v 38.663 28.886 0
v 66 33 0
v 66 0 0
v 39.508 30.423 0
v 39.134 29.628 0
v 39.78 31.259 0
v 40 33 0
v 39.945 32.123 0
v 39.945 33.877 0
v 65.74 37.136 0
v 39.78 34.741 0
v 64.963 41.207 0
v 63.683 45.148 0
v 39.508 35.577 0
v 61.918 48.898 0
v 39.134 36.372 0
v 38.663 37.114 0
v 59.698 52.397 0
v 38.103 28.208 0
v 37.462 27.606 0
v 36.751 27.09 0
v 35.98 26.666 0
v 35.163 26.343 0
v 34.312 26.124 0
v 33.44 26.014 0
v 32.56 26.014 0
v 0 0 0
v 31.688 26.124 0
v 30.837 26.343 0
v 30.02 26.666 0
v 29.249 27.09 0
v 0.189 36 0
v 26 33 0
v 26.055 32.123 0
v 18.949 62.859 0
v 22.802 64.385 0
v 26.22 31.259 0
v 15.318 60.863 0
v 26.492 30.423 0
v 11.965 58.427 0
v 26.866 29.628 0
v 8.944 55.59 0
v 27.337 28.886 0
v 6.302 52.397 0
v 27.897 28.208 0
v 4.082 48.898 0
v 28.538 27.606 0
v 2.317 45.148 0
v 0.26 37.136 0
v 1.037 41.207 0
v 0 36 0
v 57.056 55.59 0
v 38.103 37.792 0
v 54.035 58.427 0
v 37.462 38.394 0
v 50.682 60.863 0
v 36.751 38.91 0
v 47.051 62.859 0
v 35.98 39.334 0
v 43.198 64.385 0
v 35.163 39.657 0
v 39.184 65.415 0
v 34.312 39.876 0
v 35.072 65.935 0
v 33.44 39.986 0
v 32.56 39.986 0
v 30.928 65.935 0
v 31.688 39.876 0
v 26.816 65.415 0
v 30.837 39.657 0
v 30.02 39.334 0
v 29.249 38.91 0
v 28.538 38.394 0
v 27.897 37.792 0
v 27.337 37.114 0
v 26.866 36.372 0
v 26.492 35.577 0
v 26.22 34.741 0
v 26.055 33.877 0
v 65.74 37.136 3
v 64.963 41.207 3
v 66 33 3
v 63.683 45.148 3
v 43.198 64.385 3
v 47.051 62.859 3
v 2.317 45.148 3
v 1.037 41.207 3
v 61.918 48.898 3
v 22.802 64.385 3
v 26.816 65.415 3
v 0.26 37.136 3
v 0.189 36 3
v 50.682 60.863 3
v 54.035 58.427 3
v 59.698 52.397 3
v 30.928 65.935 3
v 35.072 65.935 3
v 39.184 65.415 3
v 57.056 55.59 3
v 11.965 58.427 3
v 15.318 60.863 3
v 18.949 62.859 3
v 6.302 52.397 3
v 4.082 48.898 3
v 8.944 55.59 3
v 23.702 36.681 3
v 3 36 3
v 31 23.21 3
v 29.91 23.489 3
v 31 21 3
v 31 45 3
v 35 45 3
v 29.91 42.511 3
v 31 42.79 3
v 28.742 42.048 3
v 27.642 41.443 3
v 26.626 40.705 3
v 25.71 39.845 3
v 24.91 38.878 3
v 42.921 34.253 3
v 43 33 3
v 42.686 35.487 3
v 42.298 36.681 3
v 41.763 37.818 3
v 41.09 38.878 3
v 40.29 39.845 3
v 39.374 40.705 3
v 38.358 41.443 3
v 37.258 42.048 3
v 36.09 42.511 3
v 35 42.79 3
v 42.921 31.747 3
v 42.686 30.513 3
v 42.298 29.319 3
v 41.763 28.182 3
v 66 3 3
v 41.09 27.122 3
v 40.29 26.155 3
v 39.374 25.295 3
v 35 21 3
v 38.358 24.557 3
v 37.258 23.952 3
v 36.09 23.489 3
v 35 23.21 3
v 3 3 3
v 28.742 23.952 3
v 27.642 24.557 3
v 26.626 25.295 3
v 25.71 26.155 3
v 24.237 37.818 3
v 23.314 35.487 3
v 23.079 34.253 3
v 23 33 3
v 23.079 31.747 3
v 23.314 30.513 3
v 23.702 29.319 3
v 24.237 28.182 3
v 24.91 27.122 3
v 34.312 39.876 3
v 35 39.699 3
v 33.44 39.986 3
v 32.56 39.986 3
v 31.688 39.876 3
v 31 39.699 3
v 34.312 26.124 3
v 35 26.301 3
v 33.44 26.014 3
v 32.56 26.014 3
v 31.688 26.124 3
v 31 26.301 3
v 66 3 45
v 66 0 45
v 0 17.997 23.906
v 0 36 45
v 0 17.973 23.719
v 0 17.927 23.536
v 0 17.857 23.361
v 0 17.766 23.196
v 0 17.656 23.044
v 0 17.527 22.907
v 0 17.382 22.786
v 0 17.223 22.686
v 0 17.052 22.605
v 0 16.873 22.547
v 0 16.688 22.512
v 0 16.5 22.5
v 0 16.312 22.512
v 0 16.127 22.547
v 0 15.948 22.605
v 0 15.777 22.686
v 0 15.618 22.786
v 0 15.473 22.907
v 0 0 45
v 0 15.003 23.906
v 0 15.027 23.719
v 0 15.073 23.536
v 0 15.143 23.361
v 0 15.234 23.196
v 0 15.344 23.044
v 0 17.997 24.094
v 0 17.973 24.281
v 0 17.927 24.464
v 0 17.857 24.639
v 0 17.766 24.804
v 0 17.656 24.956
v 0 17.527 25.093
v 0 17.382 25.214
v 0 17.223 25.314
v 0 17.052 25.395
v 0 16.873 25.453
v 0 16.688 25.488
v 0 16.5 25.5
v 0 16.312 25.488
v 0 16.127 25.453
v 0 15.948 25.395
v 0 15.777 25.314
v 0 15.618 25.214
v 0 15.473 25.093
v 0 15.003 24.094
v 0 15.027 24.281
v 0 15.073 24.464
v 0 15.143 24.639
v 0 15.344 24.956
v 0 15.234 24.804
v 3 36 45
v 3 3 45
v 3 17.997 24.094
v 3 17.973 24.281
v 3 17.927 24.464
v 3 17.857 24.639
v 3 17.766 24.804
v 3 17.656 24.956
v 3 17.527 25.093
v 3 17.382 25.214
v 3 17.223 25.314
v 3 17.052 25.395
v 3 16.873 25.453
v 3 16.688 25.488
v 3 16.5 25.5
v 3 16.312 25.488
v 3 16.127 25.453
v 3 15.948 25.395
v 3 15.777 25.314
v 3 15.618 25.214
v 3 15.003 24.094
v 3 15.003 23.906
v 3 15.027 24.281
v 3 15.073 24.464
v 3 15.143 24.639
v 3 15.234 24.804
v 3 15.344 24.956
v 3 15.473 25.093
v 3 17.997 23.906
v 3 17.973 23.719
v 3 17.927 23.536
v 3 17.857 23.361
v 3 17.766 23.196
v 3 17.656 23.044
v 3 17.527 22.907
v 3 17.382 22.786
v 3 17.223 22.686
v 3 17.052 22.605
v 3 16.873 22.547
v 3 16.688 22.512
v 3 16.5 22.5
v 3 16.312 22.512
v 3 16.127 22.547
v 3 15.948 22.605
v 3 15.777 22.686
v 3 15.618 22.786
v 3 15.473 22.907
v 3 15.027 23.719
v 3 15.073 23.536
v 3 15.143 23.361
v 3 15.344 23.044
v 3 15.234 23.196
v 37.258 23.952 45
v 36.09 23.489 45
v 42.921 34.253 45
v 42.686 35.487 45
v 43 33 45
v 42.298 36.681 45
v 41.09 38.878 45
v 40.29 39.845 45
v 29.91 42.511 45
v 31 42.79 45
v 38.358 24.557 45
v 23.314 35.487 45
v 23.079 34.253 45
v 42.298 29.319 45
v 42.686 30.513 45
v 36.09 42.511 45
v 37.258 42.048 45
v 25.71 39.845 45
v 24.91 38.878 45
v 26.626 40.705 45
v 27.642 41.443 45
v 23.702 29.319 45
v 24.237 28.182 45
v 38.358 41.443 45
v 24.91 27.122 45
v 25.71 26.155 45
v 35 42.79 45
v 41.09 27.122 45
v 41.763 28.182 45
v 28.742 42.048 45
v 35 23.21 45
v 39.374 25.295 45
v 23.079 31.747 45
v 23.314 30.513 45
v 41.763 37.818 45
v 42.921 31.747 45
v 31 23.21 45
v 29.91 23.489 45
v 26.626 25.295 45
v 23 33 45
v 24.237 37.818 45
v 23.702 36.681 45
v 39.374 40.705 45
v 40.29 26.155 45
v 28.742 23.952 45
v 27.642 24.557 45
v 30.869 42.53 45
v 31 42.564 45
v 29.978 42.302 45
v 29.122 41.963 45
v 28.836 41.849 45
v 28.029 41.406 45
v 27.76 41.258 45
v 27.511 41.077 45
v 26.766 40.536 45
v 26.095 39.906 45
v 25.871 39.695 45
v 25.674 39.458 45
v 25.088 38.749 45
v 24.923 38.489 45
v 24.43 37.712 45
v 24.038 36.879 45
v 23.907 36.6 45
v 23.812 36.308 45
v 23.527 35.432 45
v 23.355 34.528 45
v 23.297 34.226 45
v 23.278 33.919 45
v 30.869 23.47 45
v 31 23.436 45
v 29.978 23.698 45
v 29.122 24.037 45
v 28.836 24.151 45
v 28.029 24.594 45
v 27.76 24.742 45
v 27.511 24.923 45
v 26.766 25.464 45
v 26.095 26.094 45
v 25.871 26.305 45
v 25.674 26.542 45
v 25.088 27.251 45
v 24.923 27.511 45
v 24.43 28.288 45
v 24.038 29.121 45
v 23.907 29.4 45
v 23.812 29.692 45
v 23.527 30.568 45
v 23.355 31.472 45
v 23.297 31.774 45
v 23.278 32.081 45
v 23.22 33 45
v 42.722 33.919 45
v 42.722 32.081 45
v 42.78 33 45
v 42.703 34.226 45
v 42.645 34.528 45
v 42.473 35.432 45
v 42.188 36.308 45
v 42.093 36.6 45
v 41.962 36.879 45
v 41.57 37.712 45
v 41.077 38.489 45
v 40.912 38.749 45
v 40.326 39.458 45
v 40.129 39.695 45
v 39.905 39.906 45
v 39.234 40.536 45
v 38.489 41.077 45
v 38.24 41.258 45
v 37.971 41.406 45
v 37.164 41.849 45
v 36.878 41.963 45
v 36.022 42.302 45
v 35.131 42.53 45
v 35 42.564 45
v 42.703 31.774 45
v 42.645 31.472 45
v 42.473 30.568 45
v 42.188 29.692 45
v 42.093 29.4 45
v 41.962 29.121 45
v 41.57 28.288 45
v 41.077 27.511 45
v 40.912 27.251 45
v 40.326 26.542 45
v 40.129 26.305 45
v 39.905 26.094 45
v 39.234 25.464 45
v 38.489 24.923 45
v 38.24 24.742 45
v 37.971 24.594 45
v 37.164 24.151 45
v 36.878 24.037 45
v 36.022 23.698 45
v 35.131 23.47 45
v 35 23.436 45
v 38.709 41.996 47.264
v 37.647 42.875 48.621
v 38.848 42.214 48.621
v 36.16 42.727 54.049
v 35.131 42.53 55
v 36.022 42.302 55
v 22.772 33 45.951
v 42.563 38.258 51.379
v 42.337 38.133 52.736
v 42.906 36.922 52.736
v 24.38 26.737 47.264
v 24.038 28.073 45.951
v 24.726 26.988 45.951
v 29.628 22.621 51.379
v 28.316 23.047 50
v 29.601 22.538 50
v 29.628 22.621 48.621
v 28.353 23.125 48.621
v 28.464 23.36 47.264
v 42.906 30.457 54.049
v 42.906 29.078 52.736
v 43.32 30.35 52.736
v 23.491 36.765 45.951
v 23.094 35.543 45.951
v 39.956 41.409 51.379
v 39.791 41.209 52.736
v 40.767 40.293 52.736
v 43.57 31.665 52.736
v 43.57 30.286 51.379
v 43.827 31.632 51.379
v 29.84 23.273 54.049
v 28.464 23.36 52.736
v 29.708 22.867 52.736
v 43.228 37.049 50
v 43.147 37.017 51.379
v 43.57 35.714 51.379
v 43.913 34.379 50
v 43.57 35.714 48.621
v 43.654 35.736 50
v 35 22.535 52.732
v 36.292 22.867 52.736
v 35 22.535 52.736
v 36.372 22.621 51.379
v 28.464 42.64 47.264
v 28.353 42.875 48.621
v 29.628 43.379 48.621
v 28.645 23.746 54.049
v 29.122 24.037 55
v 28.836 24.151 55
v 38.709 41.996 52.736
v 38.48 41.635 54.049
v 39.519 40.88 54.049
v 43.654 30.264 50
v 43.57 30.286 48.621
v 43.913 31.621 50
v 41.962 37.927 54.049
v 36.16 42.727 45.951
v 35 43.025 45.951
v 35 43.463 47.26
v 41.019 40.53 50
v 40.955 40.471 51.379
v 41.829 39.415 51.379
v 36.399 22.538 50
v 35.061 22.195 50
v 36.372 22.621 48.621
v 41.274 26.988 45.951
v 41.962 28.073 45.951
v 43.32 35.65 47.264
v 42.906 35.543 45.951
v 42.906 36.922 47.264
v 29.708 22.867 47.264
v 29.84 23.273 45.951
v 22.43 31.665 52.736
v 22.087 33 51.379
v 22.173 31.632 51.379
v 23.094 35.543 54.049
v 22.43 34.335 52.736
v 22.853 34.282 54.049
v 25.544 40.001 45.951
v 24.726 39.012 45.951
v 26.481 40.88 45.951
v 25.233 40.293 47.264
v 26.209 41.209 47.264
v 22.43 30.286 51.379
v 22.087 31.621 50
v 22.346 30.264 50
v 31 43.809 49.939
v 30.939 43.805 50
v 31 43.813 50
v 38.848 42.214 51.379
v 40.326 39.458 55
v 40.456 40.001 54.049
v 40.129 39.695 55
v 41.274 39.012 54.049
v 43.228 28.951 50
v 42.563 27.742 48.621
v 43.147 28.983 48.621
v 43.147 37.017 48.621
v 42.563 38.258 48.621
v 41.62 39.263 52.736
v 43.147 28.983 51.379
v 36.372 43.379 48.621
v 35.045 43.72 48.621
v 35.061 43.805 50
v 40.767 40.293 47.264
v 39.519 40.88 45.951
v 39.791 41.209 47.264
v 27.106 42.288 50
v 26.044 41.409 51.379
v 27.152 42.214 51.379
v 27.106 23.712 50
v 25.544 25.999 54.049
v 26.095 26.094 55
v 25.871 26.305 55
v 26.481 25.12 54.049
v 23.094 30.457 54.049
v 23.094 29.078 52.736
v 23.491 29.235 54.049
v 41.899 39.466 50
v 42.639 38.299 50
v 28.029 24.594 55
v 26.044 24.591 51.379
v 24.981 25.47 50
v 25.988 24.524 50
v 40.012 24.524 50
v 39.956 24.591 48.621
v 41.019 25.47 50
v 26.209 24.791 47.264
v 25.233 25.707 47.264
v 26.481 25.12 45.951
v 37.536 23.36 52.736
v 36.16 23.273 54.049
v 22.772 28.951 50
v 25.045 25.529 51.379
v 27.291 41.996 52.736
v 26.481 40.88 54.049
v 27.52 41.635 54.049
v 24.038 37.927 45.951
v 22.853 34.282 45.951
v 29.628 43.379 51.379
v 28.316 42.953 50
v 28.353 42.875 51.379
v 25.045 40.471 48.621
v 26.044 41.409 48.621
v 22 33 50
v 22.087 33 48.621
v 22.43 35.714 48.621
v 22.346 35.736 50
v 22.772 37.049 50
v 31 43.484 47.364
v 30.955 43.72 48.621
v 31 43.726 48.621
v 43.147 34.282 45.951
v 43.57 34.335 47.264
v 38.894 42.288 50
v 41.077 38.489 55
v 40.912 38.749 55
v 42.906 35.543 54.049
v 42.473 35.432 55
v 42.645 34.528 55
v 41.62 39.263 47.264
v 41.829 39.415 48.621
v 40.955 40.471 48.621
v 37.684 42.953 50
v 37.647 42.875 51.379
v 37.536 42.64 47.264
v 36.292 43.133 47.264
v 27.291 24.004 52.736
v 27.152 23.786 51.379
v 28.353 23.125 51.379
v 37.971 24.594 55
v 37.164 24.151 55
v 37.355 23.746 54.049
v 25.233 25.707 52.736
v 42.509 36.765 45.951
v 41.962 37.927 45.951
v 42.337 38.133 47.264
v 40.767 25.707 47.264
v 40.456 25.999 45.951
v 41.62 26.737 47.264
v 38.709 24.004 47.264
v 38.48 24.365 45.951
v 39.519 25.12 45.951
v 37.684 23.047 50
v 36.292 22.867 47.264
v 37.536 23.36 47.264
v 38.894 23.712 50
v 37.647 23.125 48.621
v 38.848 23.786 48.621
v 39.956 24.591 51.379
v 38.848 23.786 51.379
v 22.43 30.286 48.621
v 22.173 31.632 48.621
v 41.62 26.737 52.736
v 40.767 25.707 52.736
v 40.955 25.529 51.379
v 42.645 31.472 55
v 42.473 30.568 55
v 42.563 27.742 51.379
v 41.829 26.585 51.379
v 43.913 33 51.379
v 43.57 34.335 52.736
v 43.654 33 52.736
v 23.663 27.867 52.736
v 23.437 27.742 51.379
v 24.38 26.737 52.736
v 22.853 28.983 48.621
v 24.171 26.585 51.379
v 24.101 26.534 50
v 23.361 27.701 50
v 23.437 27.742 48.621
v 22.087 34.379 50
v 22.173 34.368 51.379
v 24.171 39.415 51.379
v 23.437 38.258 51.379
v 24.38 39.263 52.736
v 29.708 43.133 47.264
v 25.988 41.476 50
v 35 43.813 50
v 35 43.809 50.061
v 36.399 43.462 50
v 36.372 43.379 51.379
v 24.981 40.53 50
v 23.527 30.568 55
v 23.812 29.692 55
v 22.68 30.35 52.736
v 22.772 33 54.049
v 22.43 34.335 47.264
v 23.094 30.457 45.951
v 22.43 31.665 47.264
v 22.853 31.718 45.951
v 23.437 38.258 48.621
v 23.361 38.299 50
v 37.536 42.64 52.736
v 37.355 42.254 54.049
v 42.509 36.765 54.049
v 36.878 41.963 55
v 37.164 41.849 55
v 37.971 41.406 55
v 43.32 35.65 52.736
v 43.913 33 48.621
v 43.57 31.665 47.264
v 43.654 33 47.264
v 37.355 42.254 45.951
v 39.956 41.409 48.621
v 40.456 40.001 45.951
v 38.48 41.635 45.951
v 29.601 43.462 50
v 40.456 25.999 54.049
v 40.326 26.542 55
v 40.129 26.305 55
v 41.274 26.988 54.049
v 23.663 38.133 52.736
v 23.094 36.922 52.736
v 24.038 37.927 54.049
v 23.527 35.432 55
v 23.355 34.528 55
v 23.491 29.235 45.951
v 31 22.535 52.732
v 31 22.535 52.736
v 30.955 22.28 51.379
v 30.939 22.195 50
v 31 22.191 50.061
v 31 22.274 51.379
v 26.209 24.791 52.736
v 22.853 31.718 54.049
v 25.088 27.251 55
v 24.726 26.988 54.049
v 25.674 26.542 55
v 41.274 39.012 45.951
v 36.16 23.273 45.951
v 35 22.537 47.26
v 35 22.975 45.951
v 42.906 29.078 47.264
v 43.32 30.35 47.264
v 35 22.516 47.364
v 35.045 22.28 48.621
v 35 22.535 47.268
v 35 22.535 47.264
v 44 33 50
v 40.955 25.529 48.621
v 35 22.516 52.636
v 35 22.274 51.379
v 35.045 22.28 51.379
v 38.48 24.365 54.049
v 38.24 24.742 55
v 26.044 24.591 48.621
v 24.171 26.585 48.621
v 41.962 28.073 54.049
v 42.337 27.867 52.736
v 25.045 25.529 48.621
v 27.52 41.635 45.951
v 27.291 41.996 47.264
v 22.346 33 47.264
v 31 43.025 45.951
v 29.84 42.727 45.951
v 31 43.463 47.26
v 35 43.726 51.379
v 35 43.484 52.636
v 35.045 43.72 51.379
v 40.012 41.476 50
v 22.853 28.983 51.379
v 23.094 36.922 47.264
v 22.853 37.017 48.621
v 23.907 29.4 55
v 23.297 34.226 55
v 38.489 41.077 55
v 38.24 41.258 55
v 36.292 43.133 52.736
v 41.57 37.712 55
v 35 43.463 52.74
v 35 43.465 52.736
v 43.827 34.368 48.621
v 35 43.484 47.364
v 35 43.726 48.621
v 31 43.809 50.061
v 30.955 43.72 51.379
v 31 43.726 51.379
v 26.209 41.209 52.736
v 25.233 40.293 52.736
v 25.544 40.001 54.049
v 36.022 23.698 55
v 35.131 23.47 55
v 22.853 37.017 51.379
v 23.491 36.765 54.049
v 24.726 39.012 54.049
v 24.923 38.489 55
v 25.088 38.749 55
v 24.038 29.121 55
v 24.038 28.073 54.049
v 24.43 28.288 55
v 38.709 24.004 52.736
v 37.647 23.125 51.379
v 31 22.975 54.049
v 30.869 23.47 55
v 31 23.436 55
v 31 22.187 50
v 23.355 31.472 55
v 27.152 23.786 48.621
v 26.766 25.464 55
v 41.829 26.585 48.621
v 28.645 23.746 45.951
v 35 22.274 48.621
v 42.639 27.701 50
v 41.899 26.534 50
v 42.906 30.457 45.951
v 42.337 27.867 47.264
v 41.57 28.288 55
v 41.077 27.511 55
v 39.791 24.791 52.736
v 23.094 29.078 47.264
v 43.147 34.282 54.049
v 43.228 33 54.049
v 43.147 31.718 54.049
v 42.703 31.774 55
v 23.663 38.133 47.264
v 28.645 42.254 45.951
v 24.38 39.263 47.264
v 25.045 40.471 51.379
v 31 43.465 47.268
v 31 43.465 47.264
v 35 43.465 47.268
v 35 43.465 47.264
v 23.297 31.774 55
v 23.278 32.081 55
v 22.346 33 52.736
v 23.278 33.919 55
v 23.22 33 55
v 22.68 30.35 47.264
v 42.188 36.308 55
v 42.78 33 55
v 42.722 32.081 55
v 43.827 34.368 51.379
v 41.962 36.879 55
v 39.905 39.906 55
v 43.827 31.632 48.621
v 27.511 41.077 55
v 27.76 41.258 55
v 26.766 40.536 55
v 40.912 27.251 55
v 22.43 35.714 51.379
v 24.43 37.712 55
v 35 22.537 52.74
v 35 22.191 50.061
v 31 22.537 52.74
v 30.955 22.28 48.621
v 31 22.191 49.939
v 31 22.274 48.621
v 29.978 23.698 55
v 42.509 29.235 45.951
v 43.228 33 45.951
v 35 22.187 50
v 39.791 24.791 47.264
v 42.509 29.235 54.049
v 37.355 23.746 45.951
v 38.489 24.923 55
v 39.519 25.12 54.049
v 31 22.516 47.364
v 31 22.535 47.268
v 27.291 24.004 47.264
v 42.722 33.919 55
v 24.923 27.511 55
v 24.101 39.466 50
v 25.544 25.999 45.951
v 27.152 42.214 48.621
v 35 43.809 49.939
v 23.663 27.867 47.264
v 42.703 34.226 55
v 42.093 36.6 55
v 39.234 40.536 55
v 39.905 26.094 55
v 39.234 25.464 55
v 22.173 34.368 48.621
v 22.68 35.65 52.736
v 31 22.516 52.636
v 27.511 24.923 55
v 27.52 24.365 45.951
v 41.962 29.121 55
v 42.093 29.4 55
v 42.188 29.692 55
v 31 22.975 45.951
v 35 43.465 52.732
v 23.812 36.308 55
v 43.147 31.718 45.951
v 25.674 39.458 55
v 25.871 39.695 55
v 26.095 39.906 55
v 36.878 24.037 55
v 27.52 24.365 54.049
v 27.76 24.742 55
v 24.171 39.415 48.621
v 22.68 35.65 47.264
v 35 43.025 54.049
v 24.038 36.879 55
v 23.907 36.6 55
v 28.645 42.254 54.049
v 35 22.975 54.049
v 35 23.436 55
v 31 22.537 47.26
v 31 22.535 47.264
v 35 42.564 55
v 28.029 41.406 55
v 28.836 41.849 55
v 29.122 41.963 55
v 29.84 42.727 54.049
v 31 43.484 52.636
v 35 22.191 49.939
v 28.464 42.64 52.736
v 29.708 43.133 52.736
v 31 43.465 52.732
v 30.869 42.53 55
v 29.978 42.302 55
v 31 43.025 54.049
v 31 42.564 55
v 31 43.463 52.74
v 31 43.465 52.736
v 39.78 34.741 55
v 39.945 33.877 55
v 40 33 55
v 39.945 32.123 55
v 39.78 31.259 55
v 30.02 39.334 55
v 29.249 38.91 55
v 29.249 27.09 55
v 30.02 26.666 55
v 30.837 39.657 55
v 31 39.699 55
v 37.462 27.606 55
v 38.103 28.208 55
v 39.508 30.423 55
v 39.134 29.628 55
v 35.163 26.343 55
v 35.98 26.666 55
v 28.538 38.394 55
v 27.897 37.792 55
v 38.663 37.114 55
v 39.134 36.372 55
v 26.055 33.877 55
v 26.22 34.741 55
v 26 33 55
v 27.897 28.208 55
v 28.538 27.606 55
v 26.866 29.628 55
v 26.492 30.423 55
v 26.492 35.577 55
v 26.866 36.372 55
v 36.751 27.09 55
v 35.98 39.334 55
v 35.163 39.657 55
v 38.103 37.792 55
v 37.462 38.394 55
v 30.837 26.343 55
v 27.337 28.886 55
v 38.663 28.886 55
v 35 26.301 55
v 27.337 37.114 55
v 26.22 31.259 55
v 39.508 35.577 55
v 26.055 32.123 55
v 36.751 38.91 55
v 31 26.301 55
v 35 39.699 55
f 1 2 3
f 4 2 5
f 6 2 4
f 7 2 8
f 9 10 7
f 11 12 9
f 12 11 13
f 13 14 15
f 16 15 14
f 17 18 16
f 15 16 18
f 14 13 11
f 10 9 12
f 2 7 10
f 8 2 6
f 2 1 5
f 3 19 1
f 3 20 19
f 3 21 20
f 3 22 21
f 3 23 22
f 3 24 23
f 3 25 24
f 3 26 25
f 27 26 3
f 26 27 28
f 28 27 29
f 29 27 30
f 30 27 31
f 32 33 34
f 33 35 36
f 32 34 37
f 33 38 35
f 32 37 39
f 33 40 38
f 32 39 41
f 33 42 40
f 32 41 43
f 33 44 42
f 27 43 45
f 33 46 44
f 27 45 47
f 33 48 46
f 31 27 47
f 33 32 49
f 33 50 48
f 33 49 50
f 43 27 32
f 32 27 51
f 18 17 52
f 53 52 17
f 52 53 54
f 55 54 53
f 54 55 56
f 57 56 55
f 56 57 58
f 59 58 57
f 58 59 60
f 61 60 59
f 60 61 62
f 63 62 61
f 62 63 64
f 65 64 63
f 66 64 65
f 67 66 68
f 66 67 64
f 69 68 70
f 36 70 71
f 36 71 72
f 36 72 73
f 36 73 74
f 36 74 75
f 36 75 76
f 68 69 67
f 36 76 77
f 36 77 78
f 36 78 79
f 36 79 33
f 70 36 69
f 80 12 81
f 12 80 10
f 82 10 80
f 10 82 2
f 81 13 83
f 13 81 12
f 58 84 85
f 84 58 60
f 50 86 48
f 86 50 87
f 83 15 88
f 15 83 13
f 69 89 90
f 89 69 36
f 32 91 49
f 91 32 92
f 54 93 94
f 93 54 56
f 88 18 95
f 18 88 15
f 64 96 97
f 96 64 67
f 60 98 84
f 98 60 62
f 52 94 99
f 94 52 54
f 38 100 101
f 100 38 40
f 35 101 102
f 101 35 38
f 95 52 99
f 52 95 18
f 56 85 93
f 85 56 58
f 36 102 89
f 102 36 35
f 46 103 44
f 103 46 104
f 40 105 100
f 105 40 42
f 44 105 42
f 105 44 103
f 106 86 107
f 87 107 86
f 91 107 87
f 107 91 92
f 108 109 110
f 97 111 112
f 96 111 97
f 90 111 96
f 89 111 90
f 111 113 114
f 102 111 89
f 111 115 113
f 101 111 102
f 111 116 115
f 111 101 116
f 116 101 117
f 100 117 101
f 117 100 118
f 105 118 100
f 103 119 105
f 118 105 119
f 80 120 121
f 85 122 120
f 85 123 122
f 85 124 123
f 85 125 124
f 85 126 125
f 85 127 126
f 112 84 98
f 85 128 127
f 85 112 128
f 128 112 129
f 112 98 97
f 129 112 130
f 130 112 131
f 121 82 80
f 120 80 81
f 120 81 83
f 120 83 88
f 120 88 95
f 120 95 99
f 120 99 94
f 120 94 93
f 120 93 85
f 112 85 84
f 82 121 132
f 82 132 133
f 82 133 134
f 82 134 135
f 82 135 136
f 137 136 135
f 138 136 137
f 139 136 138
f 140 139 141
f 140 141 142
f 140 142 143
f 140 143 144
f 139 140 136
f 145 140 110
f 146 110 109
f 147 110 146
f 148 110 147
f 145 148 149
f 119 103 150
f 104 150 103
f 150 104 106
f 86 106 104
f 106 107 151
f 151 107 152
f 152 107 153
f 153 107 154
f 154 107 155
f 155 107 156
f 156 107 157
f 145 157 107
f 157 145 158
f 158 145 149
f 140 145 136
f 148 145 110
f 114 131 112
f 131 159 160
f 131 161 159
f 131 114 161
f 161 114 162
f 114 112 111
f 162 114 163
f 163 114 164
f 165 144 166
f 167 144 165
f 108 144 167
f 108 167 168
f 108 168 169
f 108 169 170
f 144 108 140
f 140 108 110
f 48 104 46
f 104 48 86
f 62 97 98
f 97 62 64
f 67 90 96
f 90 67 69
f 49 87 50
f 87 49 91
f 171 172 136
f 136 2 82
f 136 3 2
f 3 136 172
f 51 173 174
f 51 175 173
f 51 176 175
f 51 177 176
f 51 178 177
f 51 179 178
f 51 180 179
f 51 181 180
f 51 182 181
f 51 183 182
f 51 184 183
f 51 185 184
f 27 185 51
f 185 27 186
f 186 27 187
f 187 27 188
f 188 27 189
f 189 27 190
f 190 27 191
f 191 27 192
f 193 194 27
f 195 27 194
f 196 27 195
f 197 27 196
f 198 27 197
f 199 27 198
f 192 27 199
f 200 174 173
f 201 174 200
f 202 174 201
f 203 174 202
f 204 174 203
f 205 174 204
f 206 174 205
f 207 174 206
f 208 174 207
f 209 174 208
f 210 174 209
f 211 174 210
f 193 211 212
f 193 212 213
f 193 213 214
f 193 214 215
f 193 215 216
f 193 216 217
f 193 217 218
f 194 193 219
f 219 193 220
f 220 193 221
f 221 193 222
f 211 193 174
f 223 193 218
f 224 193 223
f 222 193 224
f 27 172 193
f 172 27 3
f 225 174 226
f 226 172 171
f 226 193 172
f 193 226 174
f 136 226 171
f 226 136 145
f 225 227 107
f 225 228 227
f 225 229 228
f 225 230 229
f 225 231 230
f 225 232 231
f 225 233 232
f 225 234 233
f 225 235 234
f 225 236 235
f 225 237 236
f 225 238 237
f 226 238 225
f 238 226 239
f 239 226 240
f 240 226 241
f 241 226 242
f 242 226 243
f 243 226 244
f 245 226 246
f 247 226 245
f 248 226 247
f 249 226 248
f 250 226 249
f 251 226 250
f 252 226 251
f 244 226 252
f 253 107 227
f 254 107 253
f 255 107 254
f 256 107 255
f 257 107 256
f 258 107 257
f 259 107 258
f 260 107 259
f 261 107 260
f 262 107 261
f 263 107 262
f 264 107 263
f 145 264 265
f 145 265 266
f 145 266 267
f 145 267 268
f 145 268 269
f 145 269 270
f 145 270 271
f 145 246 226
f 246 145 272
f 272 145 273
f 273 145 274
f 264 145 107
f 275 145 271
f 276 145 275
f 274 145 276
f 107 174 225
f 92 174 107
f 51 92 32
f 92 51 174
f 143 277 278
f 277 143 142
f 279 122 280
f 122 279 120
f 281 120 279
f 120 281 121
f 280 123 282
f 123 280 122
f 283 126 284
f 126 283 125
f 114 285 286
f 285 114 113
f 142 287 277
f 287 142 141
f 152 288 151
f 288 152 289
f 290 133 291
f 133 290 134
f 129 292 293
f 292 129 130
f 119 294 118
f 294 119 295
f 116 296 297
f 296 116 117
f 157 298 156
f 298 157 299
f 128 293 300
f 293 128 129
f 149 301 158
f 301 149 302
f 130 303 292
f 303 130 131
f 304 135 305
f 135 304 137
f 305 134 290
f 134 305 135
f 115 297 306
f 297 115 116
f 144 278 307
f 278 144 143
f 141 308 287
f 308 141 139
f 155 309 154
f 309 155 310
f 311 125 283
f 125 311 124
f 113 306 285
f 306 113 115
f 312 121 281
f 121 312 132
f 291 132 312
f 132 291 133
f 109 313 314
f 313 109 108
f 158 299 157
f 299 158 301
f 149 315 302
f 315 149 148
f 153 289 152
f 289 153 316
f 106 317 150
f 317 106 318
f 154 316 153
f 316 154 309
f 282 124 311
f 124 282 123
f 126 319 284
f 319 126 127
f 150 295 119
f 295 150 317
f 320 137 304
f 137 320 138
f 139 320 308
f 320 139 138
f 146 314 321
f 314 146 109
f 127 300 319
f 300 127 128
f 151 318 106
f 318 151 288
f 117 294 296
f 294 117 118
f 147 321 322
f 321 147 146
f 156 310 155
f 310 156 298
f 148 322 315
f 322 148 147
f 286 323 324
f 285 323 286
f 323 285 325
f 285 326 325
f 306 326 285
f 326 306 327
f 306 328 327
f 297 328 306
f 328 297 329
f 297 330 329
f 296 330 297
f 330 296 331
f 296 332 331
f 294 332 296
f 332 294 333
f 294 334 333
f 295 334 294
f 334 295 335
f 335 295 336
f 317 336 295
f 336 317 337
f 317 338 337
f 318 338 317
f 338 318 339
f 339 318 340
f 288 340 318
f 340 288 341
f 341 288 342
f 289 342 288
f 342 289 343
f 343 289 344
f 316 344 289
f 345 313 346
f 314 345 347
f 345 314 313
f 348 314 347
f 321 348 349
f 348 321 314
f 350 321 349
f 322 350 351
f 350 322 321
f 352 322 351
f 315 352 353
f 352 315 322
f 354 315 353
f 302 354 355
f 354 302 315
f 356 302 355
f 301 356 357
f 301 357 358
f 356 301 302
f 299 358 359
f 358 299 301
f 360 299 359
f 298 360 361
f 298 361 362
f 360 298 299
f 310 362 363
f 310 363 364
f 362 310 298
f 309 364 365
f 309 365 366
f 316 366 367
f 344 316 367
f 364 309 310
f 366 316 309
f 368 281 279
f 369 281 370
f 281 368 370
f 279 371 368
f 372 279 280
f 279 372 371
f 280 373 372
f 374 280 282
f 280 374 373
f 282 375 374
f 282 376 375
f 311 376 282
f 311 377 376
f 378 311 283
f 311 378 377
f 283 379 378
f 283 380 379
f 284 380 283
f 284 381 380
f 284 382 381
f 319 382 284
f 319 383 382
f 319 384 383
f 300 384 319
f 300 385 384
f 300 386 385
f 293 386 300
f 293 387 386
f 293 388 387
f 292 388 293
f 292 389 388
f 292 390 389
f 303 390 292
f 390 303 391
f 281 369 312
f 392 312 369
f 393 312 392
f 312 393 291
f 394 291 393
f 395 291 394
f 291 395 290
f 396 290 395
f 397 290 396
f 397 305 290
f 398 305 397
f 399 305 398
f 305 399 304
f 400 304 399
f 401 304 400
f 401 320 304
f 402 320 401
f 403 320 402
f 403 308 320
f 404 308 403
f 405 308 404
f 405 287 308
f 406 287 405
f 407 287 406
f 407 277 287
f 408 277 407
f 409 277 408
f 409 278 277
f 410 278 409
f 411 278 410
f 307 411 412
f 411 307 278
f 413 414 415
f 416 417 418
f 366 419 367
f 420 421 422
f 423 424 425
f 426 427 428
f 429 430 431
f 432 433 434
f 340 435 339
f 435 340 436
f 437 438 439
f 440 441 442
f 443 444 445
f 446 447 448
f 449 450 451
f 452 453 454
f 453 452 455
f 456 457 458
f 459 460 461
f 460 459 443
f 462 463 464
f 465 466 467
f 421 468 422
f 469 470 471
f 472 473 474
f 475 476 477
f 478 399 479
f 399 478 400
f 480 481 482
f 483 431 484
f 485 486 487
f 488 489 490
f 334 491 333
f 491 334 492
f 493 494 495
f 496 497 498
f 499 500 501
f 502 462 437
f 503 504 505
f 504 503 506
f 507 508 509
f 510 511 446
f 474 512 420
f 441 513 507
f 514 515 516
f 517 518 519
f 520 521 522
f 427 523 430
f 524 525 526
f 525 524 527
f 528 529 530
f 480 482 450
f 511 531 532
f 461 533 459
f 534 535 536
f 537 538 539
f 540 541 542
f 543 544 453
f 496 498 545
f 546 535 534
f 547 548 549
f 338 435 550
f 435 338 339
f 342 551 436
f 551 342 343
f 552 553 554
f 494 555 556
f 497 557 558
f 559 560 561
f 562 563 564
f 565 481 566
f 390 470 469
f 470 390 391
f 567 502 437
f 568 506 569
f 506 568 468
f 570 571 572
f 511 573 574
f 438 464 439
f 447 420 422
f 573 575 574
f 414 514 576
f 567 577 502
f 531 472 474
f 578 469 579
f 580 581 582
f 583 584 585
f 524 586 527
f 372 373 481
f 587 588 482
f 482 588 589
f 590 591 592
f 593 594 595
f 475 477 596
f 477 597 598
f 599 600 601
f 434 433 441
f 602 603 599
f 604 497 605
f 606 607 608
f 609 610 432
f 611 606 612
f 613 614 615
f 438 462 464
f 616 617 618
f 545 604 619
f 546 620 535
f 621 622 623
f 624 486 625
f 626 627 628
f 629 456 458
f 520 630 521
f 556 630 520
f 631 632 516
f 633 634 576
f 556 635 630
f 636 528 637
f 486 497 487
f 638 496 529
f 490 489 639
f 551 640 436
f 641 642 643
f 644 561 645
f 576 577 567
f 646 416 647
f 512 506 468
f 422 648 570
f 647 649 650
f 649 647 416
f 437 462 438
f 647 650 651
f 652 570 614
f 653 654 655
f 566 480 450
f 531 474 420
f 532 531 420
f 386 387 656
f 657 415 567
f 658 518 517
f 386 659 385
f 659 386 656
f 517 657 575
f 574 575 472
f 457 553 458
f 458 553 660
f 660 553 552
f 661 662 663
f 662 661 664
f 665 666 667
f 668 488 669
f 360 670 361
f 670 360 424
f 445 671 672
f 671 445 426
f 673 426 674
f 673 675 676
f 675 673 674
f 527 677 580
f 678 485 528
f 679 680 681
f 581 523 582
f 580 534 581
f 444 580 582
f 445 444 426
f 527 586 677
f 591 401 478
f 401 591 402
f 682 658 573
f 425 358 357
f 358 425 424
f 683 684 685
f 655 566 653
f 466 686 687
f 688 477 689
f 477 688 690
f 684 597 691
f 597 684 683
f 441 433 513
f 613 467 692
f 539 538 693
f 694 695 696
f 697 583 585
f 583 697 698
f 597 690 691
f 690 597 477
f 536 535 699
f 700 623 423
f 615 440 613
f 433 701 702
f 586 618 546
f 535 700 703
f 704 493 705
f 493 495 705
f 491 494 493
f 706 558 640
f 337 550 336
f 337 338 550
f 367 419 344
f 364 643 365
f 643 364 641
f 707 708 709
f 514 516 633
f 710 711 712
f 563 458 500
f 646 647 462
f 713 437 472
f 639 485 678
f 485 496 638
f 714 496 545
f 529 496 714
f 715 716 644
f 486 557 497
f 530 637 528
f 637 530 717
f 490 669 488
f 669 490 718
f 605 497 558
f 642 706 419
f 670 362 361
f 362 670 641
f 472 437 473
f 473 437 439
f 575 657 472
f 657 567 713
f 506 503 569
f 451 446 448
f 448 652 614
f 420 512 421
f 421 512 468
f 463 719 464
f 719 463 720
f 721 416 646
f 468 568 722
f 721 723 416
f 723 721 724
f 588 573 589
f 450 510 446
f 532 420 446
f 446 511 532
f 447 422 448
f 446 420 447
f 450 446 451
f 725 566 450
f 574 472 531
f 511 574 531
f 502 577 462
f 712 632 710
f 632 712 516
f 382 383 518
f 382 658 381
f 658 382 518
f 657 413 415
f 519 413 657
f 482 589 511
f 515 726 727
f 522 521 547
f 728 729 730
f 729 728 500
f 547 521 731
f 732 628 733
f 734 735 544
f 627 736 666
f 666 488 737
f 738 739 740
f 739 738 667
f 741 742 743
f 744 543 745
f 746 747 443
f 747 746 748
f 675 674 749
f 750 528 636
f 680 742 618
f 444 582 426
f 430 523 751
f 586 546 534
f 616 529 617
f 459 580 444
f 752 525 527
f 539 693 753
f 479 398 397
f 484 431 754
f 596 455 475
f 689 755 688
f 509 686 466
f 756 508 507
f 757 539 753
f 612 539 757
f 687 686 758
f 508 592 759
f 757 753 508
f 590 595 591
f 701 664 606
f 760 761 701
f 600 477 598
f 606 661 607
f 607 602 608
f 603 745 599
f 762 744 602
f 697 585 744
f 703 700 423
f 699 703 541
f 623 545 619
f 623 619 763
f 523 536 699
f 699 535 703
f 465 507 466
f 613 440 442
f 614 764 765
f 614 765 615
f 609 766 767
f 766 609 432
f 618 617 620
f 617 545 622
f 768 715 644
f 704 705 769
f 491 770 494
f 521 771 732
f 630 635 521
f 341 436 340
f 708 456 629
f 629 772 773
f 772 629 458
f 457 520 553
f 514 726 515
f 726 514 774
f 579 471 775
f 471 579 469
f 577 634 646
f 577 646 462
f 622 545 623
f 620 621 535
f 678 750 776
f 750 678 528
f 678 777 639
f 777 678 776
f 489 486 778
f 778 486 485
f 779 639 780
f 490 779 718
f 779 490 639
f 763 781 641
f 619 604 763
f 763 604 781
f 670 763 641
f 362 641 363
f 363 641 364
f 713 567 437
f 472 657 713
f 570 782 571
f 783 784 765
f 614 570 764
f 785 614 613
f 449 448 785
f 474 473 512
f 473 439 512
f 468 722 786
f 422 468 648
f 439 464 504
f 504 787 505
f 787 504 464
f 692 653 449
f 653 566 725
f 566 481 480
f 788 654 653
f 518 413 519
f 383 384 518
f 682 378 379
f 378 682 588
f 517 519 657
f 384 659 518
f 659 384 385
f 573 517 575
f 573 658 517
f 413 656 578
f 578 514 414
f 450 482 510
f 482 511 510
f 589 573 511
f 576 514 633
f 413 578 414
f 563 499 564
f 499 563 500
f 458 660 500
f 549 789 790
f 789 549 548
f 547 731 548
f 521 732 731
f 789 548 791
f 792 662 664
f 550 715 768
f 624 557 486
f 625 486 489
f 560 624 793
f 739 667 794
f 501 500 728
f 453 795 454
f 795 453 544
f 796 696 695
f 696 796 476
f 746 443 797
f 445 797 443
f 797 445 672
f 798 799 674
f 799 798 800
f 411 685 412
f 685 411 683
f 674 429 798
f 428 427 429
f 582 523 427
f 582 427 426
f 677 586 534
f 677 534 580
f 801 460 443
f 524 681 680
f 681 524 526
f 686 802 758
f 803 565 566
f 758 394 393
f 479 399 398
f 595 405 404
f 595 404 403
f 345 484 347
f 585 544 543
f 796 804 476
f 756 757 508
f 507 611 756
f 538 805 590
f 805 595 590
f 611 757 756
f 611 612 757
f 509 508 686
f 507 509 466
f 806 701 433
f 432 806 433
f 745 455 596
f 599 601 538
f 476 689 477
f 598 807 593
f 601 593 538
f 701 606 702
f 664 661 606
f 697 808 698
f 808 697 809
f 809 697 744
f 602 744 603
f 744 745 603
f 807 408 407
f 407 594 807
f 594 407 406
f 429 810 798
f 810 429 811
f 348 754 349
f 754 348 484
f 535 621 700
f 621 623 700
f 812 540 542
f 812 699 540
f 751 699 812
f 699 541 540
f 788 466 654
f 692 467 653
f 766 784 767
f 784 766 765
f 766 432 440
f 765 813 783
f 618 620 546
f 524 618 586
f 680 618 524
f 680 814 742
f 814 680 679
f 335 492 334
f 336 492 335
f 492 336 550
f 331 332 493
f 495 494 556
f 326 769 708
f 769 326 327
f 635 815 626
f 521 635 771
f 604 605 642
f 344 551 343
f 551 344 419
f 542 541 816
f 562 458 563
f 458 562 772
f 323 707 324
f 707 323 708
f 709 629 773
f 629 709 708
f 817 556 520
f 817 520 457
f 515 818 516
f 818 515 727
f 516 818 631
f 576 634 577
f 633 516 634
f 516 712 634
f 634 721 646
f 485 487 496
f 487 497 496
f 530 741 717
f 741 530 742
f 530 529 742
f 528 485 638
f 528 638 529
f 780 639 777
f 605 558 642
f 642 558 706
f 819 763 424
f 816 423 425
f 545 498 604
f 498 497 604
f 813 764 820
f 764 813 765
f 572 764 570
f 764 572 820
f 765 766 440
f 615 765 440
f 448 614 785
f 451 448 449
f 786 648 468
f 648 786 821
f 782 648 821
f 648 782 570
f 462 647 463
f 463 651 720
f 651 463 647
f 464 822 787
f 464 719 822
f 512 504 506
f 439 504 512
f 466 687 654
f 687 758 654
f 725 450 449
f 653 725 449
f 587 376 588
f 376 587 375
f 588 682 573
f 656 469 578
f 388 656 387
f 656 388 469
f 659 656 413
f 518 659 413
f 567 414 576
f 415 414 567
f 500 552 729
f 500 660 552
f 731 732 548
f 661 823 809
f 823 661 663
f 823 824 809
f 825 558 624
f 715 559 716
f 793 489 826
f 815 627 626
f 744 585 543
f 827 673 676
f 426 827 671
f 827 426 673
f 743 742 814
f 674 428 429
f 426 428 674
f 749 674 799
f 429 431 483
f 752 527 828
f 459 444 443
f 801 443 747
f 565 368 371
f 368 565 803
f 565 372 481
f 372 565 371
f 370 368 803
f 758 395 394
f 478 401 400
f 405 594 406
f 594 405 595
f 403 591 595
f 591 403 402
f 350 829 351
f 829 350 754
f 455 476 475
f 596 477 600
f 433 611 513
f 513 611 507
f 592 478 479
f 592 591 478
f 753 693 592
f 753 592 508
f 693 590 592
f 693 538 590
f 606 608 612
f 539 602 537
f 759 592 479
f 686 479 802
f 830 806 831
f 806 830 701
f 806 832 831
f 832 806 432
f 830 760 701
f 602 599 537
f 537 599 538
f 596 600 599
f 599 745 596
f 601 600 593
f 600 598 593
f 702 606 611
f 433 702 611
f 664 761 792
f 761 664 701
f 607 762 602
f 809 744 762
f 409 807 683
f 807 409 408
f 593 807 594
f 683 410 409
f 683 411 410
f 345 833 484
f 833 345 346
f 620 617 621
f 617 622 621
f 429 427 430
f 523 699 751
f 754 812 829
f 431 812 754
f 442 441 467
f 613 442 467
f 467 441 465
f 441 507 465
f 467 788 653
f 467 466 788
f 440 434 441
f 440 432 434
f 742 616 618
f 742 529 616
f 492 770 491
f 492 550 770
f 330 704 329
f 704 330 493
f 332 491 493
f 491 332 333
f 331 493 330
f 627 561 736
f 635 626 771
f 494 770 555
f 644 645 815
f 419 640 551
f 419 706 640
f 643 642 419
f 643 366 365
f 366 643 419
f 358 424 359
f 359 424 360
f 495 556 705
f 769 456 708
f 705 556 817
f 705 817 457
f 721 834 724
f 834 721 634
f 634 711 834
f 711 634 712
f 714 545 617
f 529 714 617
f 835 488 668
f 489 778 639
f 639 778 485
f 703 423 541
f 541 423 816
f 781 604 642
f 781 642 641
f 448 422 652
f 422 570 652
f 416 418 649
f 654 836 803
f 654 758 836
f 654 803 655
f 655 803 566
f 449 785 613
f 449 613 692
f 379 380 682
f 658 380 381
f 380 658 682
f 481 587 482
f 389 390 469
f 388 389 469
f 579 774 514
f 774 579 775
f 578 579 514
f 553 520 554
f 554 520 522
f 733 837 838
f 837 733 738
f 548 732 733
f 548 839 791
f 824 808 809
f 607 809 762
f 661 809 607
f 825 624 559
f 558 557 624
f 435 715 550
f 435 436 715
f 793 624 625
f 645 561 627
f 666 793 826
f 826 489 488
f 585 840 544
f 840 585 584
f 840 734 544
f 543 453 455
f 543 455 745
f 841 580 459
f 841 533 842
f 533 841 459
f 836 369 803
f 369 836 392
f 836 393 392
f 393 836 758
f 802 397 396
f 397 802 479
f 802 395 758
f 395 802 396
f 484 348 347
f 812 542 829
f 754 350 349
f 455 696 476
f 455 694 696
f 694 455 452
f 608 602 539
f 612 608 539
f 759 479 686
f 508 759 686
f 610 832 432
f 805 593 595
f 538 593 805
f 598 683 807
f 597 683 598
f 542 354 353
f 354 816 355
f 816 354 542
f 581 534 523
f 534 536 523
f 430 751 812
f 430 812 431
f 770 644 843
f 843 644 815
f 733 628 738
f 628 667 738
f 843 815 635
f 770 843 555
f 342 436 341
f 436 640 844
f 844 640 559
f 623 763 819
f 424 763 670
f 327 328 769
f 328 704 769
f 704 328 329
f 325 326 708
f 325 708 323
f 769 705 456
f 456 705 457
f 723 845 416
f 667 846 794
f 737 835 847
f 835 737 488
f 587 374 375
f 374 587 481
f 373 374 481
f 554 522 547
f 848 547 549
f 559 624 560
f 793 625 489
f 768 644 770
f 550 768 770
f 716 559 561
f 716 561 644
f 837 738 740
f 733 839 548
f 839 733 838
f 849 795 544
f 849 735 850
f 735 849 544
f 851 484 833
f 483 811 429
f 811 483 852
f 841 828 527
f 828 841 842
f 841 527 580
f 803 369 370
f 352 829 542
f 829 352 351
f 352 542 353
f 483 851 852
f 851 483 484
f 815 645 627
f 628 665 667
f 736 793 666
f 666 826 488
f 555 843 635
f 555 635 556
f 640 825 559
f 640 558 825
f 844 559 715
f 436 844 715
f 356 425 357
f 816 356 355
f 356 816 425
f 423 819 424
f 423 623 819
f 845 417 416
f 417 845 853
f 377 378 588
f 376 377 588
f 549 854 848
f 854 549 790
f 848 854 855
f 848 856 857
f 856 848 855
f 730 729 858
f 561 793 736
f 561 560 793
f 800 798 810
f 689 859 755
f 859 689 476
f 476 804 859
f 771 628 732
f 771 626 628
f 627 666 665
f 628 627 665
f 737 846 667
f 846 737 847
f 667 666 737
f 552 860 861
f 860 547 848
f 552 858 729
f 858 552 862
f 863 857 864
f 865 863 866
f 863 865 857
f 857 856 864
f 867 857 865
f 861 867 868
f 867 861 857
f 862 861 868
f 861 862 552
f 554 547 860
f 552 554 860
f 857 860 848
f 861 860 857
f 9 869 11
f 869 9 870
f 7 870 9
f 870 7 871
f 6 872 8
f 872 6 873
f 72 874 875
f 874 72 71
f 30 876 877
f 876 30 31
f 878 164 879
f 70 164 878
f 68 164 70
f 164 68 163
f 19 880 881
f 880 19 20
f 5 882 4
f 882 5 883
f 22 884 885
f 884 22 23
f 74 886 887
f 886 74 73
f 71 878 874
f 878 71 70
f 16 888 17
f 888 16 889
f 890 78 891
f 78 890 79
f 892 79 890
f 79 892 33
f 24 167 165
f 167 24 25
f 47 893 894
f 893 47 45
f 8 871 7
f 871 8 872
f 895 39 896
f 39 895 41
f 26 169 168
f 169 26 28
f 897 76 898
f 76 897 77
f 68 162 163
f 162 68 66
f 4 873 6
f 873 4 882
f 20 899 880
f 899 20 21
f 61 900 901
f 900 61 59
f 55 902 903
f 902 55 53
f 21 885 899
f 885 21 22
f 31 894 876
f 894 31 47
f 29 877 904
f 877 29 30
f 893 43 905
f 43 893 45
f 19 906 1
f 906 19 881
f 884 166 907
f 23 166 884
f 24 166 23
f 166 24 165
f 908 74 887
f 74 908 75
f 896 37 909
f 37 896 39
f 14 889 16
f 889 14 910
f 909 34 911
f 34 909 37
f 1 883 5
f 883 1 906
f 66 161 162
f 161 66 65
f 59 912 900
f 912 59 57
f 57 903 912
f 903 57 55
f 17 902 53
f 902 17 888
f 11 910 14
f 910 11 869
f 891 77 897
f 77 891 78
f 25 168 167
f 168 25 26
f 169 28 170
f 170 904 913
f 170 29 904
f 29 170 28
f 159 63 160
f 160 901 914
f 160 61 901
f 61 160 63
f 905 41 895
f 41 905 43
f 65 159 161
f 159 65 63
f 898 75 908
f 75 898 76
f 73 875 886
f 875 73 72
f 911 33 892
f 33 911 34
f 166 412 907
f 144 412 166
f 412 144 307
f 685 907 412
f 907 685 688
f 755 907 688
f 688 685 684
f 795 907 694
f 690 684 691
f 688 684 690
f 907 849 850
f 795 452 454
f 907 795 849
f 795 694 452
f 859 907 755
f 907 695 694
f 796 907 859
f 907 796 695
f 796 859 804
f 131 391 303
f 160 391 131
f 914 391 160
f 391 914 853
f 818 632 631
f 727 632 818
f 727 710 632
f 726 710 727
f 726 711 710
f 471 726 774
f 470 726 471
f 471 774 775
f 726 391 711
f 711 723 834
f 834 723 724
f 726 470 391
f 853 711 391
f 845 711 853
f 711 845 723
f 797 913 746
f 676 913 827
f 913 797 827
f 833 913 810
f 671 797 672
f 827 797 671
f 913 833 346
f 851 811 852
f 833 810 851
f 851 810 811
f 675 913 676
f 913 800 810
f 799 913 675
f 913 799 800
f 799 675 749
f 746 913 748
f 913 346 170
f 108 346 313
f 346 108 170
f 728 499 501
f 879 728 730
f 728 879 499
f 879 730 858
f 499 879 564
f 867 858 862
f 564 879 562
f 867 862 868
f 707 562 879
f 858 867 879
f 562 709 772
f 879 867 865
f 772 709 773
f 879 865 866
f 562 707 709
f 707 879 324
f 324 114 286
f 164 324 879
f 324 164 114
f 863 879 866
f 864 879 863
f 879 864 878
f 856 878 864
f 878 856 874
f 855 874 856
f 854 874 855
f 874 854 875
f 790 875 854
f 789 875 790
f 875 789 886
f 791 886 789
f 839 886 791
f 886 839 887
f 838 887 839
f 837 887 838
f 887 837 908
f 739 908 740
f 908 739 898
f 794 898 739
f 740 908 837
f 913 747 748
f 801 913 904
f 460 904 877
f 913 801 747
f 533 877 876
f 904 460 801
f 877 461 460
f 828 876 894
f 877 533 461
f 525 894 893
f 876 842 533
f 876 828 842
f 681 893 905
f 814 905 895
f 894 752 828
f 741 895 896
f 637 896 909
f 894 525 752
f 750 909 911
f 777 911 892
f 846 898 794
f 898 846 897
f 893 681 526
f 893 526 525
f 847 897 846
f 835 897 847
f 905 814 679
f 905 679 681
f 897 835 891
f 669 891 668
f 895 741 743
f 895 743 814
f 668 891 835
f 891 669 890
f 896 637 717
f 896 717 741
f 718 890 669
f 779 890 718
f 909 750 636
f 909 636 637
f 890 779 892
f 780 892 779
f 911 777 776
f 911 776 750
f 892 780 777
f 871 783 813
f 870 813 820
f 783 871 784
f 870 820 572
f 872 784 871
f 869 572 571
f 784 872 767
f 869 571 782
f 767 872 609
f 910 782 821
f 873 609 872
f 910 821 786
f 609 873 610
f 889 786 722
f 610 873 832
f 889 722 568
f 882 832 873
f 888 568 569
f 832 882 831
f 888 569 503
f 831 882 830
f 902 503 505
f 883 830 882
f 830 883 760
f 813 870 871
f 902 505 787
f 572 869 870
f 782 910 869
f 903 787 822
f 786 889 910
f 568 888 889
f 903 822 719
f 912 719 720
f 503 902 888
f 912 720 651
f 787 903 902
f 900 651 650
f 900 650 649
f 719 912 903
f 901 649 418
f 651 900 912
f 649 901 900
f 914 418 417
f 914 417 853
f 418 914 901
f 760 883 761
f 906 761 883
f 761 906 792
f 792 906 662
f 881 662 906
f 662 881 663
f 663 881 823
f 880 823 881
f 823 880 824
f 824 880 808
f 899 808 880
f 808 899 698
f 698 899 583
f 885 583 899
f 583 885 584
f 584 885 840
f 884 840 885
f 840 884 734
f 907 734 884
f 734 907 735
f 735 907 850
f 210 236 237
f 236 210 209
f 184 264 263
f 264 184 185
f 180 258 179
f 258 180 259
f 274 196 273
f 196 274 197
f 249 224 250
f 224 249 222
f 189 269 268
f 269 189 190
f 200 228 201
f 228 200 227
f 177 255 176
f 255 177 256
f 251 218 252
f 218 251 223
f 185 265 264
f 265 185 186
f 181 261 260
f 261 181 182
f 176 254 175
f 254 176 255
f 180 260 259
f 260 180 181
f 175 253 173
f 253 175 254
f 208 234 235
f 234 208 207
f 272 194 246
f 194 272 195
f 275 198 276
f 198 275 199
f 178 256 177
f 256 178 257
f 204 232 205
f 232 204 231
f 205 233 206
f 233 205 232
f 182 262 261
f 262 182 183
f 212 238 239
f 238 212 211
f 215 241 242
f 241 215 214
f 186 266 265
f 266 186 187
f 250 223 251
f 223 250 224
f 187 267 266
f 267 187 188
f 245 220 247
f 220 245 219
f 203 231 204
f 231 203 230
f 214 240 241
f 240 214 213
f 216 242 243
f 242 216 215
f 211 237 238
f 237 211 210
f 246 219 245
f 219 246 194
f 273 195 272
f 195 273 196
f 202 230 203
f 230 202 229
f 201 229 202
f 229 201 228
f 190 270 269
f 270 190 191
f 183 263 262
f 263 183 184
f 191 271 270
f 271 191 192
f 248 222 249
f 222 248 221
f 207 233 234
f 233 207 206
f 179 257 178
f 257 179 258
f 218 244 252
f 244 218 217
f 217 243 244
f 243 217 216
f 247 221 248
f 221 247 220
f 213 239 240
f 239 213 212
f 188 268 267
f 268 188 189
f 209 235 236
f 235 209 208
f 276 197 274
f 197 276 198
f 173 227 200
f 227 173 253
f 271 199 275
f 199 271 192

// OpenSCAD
//smoothness
$fn=50;//[10:200]

//Inner diameter of spool in mm
ID=20;

//Outer diameter of spool in mm
OD=50;

//the width of the spool in mm
spool_width=42;

//wall thickness (mm). Recommended minimum 3mm
wall_thickness=3;

//The space between the spool and the walls
clearance=5;

// The dia of the hole for the solder to pass through
hole_size=1.5;

r=OD/2+clearance+wall_thickness;

difference(){
	union(){
		translate([r,r,0])cylinder(wall_thickness,r,r);
		cube([2*r,r,wall_thickness]);
		cube([2*r,wall_thickness,spool_width+wall_thickness]);
		cube([wall_thickness,r+wall_thickness,spool_width+wall_thickness]);
		translate([r,r,0])cylinder(wall_thickness+spool_width,ID/2,ID/2);
		translate([r,r,spool_width+wall_thickness+ID/4])sphere(ID/2+1);
	}
	translate([r,r,-1])cylinder(wall_thickness+spool_width+2*ID,ID/2-wall_thickness,ID/2-wall_thickness);
	translate([r-2,r-ID/2-2,wall_thickness])cube([4,ID+2+2,spool_width+ID+1]);
	translate([r,r,spool_width+wall_thickness+0.5*ID])cylinder(ID,ID/2+1,ID/2+1);
	translate([-1,r/2,spool_width/2+wall_thickness])rotate([0,90,0])cylinder(wall_thickness+2,hole_size,hole_size);
}
